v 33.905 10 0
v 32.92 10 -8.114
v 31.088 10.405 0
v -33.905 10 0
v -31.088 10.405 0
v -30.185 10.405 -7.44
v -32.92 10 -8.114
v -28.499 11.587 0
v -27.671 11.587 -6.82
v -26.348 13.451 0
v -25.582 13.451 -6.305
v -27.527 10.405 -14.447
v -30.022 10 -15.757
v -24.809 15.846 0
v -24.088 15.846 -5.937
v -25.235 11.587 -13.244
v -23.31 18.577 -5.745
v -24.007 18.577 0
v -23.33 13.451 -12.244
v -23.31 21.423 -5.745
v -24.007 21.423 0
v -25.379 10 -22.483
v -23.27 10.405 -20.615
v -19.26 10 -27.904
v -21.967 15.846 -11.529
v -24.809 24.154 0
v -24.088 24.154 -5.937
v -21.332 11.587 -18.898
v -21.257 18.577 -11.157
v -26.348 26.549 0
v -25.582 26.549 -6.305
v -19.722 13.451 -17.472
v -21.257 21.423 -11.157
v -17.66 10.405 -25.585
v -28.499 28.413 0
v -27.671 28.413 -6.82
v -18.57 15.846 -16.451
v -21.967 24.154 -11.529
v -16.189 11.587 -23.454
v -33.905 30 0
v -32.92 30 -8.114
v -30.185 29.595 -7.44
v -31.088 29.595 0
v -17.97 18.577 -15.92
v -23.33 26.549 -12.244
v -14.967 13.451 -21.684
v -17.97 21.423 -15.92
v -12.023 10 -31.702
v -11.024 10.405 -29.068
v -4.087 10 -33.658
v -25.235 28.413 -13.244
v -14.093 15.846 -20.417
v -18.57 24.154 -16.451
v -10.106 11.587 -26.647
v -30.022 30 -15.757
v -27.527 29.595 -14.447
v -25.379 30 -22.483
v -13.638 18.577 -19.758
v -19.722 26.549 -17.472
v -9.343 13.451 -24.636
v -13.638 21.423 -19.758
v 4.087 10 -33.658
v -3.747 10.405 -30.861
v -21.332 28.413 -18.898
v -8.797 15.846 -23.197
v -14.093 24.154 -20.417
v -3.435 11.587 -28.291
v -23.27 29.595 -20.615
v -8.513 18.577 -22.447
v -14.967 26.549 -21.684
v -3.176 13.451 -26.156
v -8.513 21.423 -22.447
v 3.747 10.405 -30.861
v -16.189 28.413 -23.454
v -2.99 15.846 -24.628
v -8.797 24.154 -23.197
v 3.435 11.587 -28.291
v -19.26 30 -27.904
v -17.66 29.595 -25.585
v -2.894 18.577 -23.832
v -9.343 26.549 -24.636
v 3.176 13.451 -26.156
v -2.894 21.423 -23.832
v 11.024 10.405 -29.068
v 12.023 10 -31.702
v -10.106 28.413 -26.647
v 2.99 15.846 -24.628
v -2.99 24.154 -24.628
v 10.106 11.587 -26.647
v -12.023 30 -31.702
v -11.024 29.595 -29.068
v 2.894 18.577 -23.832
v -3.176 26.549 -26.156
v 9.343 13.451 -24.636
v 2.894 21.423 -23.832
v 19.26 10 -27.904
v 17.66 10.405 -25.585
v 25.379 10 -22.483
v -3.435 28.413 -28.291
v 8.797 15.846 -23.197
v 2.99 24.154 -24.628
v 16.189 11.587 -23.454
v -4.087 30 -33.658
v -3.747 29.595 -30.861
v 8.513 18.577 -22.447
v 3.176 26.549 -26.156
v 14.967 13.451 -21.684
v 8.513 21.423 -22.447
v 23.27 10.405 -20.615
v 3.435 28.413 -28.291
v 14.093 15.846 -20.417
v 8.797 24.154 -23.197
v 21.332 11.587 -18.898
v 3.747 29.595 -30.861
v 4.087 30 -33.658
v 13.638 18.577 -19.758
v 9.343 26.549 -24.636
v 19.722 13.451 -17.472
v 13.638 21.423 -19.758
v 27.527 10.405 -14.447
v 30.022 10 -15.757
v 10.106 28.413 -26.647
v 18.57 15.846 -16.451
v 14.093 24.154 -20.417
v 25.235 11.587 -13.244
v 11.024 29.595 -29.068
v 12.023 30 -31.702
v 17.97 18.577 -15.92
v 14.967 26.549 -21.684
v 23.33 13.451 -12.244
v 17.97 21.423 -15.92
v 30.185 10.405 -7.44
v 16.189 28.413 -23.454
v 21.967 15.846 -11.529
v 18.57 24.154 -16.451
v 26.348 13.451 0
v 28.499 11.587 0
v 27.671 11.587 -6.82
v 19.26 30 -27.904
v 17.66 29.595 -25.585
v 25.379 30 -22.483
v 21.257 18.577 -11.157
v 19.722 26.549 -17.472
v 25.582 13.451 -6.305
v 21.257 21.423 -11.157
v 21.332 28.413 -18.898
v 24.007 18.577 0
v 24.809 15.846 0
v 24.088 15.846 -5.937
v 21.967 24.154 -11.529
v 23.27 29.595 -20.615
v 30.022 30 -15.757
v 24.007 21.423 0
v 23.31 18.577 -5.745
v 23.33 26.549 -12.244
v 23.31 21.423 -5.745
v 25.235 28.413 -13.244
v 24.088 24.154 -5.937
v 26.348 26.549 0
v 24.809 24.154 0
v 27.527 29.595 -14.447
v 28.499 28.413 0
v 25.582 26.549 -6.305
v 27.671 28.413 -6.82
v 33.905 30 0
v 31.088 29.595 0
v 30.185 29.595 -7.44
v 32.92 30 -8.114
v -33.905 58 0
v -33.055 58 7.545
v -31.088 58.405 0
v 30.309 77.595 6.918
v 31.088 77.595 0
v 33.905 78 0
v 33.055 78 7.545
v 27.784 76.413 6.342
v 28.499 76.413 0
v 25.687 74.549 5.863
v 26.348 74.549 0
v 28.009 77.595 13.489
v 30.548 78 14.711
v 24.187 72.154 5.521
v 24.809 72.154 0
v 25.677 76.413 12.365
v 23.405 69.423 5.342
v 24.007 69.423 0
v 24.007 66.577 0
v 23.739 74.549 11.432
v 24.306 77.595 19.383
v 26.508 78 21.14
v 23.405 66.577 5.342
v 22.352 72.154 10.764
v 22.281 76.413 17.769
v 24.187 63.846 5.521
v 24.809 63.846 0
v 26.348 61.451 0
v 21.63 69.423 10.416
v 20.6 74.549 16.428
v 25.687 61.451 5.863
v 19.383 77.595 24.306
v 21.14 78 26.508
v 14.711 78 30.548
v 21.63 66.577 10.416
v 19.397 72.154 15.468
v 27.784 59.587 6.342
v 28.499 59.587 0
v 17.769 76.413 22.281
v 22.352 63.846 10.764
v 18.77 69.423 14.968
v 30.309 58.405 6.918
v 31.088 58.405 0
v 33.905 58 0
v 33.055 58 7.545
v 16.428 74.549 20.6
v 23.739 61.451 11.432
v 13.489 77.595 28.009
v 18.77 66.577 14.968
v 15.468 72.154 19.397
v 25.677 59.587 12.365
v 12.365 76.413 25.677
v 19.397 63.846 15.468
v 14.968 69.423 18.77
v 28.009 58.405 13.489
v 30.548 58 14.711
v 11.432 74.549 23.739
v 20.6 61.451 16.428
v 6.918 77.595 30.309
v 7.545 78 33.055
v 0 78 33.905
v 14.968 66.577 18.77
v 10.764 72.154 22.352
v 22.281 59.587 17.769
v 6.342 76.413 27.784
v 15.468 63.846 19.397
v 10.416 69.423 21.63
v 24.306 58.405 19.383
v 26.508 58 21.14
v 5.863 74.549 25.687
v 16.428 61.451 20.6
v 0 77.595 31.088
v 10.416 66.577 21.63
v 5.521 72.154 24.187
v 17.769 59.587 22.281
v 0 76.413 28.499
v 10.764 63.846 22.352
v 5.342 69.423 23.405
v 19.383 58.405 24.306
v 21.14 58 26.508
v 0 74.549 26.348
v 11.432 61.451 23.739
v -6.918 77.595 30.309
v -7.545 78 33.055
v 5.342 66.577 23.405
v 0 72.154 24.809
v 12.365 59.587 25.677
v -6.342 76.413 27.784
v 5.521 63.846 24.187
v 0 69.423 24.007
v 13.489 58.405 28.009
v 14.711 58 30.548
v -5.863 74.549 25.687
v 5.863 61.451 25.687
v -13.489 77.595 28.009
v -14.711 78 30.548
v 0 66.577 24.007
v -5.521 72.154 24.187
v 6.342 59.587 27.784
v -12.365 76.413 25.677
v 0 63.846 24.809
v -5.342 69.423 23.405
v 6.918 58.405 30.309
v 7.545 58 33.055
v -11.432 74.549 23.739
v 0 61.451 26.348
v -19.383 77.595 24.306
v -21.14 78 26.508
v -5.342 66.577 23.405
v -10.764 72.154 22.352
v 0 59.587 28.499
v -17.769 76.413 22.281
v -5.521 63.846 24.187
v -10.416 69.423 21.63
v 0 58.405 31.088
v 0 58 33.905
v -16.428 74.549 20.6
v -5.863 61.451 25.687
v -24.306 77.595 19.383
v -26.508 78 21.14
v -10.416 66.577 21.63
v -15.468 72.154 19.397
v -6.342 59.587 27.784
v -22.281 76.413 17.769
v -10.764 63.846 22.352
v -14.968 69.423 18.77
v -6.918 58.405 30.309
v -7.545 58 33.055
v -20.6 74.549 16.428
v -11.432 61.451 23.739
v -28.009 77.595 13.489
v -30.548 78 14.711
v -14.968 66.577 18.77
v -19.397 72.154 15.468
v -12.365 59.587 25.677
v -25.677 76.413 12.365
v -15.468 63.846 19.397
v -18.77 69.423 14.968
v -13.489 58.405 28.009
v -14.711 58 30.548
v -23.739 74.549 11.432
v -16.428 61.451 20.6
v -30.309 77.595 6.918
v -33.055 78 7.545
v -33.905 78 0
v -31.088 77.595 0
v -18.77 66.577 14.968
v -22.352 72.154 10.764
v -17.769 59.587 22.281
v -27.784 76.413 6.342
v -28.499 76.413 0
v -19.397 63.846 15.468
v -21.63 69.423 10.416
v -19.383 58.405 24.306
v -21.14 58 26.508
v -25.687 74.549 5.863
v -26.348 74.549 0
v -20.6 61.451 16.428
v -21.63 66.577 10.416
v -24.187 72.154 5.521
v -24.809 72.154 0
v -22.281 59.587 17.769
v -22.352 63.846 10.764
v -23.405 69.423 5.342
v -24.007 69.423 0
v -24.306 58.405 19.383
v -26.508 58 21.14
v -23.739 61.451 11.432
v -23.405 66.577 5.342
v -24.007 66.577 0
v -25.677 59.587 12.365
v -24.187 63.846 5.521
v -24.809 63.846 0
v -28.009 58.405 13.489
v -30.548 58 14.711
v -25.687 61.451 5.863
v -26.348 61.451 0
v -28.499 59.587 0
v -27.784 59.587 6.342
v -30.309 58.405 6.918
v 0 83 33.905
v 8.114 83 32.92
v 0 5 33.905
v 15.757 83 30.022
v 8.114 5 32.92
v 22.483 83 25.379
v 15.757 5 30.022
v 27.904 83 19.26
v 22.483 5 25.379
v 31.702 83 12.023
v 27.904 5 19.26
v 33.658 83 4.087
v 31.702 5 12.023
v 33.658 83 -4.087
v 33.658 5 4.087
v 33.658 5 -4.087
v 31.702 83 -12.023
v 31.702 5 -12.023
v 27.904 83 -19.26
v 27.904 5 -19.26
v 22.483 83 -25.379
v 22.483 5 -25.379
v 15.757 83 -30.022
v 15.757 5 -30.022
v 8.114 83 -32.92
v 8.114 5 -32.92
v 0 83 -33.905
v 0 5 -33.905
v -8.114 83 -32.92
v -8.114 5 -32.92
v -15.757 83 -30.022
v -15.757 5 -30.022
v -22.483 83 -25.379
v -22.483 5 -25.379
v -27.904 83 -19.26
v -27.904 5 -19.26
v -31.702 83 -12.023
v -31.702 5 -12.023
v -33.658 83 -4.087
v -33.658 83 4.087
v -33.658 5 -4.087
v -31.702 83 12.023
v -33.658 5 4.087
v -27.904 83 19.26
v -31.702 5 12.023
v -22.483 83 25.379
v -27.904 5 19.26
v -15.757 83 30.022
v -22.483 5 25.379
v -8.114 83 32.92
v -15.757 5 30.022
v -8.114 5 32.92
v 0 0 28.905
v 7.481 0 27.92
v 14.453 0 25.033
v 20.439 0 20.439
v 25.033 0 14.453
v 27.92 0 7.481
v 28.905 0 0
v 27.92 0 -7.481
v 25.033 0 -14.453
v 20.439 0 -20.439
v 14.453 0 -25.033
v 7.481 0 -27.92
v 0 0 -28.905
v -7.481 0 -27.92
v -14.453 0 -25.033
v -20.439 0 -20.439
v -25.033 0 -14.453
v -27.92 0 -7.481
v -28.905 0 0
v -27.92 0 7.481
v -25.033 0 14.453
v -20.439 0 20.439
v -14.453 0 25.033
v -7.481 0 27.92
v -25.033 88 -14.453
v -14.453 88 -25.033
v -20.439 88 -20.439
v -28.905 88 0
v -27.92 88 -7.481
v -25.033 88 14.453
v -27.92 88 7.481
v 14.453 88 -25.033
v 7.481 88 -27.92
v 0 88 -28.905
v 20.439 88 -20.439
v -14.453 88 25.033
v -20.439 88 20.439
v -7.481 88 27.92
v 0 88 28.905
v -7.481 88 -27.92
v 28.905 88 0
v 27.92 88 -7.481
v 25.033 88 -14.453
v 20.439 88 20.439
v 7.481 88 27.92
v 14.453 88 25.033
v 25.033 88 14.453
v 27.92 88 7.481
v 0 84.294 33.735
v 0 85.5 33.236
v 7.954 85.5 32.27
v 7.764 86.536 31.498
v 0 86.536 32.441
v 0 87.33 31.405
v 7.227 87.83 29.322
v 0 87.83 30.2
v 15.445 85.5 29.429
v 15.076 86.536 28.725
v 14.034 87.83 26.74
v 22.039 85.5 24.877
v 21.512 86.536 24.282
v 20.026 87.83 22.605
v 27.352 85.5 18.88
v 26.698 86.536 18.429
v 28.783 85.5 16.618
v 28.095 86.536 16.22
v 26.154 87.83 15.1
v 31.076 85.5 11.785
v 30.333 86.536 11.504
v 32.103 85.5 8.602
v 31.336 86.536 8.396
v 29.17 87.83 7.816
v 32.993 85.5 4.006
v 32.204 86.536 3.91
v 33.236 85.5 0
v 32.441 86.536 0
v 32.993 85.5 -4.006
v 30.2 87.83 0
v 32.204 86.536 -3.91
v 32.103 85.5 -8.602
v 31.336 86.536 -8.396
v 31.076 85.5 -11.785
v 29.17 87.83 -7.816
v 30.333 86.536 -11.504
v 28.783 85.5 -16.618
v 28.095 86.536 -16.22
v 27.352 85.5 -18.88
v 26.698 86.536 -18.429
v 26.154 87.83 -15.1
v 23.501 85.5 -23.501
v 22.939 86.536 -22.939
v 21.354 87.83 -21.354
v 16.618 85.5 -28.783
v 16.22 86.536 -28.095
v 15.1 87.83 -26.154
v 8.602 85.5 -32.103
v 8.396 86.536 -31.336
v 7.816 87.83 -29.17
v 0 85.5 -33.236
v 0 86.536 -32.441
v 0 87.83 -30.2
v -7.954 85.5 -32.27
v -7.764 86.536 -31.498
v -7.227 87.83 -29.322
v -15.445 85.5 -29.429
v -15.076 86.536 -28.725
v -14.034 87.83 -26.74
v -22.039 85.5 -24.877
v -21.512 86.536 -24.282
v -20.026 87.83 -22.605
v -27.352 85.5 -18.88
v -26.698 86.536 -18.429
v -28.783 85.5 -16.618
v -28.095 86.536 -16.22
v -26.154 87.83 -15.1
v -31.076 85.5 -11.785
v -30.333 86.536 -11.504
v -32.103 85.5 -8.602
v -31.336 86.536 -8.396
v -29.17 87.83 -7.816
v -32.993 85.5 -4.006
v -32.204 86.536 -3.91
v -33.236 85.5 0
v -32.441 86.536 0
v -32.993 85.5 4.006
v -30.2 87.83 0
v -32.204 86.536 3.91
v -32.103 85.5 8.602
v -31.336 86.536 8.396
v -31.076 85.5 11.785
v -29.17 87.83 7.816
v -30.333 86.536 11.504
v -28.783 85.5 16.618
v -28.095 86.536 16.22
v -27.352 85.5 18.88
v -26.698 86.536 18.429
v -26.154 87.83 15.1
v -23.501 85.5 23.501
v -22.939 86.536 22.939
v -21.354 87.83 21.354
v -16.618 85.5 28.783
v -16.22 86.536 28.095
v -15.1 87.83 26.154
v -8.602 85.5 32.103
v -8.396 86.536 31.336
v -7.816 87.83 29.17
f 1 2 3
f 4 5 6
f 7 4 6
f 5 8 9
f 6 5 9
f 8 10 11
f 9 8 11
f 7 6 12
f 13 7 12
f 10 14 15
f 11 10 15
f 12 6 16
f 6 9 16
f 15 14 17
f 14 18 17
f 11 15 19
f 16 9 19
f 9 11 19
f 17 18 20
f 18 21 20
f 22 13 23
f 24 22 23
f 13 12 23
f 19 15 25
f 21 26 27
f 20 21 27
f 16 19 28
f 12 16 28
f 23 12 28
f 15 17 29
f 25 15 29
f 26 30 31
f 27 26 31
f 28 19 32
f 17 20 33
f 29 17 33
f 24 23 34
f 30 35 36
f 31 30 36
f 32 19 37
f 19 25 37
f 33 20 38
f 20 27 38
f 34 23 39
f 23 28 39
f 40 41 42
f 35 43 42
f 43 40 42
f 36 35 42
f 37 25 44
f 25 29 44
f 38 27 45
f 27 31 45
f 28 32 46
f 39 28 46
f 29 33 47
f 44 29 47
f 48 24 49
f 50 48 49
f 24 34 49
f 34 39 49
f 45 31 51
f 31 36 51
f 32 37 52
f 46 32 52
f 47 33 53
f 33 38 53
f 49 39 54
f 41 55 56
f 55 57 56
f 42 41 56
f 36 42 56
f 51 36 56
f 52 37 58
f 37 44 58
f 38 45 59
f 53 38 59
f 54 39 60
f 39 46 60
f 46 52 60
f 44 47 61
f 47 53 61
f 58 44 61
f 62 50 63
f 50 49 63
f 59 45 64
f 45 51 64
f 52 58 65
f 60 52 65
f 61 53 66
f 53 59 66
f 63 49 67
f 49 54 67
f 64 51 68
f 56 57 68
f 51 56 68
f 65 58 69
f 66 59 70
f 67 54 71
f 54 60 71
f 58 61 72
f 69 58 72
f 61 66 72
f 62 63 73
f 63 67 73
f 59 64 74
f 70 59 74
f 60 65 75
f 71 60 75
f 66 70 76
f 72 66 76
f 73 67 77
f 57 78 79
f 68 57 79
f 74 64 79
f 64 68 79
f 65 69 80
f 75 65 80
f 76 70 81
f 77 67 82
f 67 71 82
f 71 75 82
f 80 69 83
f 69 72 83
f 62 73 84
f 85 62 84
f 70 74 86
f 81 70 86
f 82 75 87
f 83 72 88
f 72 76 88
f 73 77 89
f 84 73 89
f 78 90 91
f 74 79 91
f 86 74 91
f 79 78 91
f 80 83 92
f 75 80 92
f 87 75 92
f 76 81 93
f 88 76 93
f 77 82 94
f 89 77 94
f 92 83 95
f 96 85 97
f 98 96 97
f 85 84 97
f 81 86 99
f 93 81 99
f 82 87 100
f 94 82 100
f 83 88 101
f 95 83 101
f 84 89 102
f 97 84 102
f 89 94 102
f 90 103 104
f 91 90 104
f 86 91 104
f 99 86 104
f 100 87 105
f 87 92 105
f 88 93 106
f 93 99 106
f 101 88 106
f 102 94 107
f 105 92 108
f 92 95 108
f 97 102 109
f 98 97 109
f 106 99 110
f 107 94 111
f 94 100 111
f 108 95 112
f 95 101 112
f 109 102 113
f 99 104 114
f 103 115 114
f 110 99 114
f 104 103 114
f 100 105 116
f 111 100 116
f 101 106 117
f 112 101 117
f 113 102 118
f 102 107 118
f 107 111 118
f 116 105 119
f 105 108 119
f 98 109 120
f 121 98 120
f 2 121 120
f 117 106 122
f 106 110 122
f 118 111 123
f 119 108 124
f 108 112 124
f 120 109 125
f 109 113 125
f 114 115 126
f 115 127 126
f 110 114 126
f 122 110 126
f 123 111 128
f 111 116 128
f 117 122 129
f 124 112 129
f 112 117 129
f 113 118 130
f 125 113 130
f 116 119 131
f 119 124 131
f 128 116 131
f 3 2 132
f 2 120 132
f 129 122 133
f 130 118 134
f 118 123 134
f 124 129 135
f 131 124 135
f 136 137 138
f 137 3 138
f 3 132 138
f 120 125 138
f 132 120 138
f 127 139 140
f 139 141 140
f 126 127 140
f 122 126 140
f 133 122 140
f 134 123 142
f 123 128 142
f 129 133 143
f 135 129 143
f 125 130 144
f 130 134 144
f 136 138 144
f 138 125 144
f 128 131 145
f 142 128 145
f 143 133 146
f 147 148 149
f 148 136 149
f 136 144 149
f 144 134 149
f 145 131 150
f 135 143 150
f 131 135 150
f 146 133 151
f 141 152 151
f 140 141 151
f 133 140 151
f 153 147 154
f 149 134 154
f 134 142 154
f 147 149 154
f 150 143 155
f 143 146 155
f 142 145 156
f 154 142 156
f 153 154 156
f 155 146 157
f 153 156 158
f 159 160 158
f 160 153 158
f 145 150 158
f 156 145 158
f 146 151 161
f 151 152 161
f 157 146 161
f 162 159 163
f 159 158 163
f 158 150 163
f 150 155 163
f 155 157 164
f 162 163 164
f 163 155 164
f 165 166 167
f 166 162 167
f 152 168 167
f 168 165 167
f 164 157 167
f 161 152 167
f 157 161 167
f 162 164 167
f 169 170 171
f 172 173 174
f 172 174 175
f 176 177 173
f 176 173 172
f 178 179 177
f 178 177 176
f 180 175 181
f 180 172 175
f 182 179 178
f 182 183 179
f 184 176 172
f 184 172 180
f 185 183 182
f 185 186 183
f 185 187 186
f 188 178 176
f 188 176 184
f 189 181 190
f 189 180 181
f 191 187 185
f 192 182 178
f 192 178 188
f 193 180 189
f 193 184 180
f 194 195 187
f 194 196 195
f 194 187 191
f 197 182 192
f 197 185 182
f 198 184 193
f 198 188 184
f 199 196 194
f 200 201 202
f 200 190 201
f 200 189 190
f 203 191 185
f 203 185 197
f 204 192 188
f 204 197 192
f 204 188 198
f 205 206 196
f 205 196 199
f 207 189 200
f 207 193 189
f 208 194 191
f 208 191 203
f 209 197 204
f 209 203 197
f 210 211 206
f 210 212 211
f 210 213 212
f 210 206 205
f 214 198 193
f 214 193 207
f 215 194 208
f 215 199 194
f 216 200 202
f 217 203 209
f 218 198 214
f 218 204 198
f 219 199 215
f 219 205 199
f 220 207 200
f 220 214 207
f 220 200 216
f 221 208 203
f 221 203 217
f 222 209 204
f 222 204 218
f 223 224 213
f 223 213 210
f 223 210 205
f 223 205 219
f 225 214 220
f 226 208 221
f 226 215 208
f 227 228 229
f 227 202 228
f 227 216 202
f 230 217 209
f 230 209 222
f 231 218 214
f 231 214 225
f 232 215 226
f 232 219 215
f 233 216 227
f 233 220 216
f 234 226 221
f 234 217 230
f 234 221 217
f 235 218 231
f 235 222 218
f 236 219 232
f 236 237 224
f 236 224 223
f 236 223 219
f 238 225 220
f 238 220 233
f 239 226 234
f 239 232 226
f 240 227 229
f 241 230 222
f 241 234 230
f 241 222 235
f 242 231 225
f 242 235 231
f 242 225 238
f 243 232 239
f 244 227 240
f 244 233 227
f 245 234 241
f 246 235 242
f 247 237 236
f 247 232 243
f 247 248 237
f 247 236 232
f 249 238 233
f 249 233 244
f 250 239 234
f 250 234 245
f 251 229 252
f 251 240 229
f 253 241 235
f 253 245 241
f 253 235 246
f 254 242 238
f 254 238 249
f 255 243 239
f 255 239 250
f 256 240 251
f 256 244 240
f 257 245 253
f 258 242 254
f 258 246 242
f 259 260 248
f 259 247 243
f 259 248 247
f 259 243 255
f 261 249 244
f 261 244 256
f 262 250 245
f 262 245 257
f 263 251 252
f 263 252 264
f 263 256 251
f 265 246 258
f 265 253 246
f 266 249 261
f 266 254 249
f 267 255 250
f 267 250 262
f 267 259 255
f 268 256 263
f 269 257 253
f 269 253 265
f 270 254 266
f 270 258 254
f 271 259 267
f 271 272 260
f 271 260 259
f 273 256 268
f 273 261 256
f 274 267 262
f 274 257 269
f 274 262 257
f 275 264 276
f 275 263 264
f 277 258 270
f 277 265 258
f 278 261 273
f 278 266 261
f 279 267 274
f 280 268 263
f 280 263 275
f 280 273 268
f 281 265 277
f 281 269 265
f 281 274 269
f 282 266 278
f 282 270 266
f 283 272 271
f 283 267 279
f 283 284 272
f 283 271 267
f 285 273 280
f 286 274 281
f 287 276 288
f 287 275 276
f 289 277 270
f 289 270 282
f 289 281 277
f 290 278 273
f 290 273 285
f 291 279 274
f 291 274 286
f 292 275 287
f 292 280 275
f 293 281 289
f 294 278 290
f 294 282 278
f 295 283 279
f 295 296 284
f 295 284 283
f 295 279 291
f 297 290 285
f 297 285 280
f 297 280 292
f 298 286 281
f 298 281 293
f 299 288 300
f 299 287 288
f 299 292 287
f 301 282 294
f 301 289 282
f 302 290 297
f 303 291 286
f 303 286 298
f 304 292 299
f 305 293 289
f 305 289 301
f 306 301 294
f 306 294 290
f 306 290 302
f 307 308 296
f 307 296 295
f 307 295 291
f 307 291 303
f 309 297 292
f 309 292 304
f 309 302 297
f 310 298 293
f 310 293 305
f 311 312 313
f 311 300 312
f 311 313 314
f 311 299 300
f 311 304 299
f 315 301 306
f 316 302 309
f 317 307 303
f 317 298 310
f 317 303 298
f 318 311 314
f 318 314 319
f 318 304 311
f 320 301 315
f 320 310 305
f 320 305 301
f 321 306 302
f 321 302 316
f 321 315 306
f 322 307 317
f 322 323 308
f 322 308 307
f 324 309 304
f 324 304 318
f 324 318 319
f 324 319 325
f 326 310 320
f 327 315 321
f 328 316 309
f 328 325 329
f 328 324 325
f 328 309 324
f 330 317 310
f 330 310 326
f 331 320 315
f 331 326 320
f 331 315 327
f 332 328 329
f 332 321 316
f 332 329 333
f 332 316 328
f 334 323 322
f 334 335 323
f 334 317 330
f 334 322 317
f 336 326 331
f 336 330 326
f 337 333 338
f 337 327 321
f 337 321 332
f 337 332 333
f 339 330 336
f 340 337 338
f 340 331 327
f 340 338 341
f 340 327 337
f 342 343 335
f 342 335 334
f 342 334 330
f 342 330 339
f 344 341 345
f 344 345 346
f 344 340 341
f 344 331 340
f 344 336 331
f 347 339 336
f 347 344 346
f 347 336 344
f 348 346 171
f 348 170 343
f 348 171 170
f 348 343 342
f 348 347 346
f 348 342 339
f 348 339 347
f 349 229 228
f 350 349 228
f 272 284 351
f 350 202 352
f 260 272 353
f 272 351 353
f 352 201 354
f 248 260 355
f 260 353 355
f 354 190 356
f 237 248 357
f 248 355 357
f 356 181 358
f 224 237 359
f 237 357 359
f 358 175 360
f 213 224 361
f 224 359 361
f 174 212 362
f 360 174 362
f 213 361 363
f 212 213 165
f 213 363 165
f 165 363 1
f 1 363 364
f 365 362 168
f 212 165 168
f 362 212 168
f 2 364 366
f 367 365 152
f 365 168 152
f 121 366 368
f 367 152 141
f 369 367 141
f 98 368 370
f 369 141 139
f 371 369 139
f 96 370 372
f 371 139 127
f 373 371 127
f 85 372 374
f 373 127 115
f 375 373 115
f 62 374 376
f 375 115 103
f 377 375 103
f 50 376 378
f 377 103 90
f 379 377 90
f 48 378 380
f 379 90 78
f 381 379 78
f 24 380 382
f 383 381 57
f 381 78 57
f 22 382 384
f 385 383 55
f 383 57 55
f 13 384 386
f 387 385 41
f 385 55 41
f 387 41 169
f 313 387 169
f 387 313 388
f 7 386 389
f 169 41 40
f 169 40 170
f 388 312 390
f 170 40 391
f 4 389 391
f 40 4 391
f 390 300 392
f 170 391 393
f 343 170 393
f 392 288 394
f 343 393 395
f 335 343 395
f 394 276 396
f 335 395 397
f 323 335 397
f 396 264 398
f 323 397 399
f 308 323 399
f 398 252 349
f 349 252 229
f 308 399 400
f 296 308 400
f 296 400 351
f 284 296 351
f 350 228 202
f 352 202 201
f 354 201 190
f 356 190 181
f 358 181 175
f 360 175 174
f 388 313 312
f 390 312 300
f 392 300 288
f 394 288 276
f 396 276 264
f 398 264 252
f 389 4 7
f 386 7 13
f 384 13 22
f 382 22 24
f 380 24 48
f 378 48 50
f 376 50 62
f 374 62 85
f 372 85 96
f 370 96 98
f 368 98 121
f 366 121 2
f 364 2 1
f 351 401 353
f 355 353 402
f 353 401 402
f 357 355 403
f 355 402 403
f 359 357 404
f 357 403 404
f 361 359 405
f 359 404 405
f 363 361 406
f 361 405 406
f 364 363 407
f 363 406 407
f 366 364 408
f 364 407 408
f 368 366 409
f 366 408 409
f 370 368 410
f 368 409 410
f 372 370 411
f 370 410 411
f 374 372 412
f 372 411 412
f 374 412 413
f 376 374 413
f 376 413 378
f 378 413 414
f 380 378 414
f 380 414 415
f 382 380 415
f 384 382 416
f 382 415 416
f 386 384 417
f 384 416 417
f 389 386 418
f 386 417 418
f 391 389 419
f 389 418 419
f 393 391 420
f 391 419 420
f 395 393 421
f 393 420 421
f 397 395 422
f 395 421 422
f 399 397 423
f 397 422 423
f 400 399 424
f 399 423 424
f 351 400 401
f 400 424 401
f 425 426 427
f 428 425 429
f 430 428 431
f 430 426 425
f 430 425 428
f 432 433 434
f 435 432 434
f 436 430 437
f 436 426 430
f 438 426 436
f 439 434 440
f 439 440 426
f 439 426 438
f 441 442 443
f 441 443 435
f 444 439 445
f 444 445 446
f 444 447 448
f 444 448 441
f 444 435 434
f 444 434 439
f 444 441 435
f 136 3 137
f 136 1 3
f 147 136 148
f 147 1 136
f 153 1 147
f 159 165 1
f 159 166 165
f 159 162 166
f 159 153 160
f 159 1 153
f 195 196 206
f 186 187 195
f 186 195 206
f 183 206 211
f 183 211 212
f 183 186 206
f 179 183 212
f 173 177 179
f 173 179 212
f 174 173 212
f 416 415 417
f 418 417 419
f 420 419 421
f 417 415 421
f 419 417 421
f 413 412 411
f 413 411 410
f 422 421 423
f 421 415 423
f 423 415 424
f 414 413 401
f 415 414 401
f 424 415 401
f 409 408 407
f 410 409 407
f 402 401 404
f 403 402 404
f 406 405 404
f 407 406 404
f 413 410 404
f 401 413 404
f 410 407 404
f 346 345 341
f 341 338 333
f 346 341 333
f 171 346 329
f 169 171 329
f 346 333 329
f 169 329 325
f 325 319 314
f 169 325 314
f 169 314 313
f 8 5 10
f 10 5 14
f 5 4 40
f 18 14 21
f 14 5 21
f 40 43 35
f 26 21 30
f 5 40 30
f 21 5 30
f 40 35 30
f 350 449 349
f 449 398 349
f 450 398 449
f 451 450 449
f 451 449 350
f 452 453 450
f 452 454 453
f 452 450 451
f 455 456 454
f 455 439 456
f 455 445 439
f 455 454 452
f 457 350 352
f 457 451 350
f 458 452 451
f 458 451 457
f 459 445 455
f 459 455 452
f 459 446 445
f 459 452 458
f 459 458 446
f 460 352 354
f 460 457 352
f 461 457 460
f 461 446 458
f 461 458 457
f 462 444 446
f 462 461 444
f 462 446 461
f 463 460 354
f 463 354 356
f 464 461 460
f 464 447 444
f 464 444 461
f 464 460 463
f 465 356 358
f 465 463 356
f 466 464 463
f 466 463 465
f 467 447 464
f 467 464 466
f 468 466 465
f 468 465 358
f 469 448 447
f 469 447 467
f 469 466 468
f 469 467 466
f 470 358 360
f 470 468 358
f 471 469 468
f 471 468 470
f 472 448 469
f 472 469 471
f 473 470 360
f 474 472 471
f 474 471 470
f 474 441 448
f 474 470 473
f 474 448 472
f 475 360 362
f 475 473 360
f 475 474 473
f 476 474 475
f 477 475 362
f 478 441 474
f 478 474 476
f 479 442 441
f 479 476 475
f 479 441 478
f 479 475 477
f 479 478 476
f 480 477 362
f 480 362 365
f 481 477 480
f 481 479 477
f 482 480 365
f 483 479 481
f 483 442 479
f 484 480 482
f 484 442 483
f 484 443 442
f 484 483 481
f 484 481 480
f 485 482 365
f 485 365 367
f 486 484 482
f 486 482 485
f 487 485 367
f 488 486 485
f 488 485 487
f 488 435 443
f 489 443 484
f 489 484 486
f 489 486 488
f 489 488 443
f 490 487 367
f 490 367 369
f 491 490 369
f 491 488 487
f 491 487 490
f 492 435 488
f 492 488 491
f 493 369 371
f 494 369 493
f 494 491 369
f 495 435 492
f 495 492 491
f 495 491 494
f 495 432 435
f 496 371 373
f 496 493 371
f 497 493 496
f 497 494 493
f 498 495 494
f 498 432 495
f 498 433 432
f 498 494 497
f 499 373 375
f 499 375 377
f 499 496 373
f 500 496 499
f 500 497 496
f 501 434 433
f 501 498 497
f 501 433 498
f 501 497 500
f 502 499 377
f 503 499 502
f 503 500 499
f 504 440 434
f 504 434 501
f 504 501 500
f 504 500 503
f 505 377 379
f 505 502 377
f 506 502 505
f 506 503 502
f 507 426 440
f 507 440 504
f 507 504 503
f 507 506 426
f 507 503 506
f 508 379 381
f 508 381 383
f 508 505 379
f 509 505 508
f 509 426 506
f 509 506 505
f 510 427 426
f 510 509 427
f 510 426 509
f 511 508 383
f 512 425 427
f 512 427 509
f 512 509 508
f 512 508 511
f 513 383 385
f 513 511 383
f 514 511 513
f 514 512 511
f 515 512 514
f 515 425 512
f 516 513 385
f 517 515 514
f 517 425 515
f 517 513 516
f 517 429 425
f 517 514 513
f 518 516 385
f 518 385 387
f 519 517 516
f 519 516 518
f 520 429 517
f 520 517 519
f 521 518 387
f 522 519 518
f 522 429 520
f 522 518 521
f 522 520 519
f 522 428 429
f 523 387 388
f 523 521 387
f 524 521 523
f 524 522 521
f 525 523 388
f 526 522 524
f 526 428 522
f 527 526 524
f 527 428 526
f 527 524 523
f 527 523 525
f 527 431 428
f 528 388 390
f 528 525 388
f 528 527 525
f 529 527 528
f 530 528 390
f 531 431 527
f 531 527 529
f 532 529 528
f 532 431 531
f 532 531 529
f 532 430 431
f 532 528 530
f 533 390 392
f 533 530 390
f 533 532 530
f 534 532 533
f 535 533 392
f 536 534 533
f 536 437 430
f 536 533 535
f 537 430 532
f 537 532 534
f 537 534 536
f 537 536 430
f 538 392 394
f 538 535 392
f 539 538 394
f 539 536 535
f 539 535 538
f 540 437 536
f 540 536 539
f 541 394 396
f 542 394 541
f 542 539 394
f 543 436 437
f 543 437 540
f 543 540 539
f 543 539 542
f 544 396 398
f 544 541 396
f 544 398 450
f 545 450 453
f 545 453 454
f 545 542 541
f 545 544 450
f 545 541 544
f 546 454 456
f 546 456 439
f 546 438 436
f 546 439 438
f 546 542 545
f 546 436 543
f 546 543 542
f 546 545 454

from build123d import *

# Parameters (mm, degrees)
SKETCH1_R           = 33.905425059
BOSS_EXTRUDE1_DEPTH = 88
SKETCH2_R           = 10
CUT_REVOLVE1_ANGLE  = 180
FILLET1_R           = 5
CHAMFER1_SIZE       = 5


with BuildPart() as part:
    # Sketch1 → Boss-Extrude1 (new body)
    with BuildSketch(Plane(origin=(0, 0, 0), x_dir=(1, 0, 0), z_dir=(0, 1, 0))):
        with Locations(Location((0, 0, 0), (0, 0, 270))):
            Circle(SKETCH1_R)
    extrude(amount=BOSS_EXTRUDE1_DEPTH)

    # Sketch2 → Cut-Revolve1 (revolve, cut)
    with BuildSketch(Plane.XY):
        with Locations((33.905425059, 68)):
            Circle(SKETCH2_R)
        with Locations((-33.905425059, 20)):
            Circle(SKETCH2_R)
    revolve(axis=Axis((0, 39.08266512, 0), (0, -1, 0)), revolution_arc=CUT_REVOLVE1_ANGLE, mode=Mode.SUBTRACT)

    # Fillet1
    fillet1_edges = [part.edges().sort_by_distance(p)[0] for p in [
        (0, 88, -33.905425059),
    ]]
    fillet(fillet1_edges, radius=FILLET1_R)

    # Chamfer1
    chamfer1_edges = [part.edges().sort_by_distance(p)[0] for p in [
        (0, 0, -33.905425059),
    ]]
    chamfer(chamfer1_edges, length=CHAMFER1_SIZE)


solid = part.part
